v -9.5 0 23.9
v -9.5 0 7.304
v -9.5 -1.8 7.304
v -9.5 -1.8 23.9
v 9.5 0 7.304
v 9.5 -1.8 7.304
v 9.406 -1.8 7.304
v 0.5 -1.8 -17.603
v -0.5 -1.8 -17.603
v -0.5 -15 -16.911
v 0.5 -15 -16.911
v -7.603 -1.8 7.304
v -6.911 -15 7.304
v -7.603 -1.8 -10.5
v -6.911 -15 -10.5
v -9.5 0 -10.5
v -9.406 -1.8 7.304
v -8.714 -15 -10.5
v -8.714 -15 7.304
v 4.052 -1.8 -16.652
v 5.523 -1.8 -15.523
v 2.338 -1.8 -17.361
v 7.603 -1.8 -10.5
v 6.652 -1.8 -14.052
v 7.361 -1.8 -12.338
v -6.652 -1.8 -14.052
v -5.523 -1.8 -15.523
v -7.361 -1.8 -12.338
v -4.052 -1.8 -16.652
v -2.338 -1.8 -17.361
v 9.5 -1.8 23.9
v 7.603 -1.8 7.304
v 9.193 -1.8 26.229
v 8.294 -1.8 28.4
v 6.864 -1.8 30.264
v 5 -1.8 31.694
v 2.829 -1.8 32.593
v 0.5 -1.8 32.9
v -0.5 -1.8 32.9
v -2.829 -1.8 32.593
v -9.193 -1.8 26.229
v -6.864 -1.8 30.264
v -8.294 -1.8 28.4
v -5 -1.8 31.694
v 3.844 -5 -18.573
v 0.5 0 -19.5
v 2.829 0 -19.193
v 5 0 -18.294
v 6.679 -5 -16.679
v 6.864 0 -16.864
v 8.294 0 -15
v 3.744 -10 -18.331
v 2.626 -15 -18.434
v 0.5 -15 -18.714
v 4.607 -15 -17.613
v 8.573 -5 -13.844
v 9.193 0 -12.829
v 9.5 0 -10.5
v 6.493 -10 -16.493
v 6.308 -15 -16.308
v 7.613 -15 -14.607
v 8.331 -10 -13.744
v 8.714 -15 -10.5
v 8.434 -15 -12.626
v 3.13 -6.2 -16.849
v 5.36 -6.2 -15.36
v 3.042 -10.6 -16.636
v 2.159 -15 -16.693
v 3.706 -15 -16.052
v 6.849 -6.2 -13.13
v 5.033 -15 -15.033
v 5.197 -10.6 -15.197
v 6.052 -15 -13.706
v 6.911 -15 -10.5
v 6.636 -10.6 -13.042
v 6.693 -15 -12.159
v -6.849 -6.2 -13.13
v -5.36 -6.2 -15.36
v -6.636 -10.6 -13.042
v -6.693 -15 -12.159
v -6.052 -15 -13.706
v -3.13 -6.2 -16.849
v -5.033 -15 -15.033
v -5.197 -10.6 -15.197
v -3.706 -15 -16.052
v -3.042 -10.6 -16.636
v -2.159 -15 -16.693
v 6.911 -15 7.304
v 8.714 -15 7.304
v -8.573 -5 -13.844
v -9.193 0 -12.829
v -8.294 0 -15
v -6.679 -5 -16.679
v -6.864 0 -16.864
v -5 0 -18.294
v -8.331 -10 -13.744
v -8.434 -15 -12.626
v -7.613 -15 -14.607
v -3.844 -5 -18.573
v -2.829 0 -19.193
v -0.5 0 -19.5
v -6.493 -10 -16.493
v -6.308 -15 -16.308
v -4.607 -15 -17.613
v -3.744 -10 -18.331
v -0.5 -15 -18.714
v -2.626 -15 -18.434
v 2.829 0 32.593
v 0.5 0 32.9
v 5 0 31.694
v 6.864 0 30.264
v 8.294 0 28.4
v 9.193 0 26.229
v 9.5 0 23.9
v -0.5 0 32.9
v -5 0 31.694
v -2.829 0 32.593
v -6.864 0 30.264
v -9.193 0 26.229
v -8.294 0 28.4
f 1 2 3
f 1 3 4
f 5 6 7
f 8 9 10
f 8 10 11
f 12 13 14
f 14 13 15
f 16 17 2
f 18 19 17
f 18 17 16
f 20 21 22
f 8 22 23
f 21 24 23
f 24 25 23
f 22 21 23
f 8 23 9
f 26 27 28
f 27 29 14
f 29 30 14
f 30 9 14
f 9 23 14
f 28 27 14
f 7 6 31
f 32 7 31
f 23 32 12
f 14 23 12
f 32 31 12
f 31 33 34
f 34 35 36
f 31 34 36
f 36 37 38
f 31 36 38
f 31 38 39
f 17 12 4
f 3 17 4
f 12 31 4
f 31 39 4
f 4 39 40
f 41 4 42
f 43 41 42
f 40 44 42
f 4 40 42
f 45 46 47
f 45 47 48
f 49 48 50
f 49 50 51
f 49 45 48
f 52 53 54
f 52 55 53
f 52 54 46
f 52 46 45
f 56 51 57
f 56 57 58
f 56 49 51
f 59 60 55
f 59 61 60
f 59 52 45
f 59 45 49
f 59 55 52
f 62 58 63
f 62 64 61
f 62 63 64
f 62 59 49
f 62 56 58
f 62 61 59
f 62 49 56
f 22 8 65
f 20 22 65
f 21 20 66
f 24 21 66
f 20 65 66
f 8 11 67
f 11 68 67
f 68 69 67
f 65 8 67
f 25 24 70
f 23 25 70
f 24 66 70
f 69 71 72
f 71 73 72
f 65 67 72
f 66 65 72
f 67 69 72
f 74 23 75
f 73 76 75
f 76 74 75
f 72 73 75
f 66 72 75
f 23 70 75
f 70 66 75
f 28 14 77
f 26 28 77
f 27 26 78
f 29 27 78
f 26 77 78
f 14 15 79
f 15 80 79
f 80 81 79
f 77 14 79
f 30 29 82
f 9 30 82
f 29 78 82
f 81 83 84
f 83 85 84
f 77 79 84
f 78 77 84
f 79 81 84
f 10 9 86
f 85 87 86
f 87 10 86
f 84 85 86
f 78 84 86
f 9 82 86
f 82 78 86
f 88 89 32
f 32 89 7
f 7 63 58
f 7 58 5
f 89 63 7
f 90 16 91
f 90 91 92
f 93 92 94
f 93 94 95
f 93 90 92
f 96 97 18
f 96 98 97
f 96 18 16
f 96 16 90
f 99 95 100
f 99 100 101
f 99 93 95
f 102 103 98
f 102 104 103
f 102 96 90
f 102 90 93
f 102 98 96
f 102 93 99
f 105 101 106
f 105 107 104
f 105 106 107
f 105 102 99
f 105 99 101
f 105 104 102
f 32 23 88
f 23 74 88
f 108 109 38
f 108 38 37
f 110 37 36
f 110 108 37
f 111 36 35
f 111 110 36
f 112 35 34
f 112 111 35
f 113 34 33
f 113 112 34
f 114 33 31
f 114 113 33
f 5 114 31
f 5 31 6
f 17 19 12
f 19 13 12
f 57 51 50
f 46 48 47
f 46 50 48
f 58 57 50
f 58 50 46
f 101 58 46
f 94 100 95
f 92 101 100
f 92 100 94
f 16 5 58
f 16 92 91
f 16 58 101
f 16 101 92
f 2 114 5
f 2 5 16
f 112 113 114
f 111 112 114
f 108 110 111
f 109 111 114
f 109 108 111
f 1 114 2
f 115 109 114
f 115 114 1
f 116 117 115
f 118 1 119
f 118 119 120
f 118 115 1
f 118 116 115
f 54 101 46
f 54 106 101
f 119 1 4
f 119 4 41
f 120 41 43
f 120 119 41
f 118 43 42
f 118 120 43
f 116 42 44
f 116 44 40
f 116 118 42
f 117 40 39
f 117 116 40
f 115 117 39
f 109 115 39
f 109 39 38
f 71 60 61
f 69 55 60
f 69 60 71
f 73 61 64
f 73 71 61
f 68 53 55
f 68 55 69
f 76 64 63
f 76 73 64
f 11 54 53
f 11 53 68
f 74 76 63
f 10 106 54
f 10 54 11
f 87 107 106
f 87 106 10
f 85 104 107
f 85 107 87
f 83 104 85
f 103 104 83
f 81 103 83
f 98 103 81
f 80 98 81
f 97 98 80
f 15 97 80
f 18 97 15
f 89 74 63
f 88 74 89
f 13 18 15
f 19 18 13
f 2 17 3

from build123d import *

# Parameters (mm, degrees)
F1_DEPTH = 15
F1_TAPER = 3.0006
F2_T     = -1.8
F3_W     = 16.786262393
F3_H     = 17.0369902626
F4_DEPTH = 28
F6_DEPTH = 1.8


# Not quite as in the source:
# - ends of sketch curves that miss each other by under 0.0002 mm in the source are joined


with BuildPart() as f1:
    # F0 (on Front) → F1 (new body)
    with BuildSketch(Plane.XZ):
        with BuildLine():
            Line((0.5, 19.5), (-0.5, 19.5))
            ThreePointArc((-0.5, 19.5), (-6.8639610307, 16.8639610307), (-9.5, 10.5))
            Line((-9.5, 10.5), (-9.5, -10.5))
            ThreePointArc((-9.5, -10.5), (-6.8639610307, -16.8639610307), (-0.5, -19.5))
            Line((-0.5, -19.5), (0.5, -19.5))
            ThreePointArc((0.5, -19.5), (6.8639610307, -16.8639610307), (9.5, -10.5))
            Line((9.5, -10.5), (9.5, 10.5))
            ThreePointArc((9.5, 10.5), (6.8639610307, 16.8639610307), (0.5, 19.5))
        make_face()
    extrude(amount=F1_DEPTH, taper=F1_TAPER)

    # F2
    f2_openings = [f1.faces().sort_by_distance(p)[0] for p in [
        (0, 0, 0),
        (0, -15, 0),
    ]]
    offset(amount=F2_T, openings=f2_openings)

    # F3 (on Right) → F4 (cut, symmetric)
    with BuildSketch(Plane.YZ):
        with Locations((-8.3931311965, 15.8226261847)):
            Rectangle(F3_W, F3_H)
    extrude(amount=F4_DEPTH, both=True, mode=Mode.SUBTRACT)

    # F5 (on face) → F6 (join)
    with BuildSketch(Plane(origin=(0, 0, 0), x_dir=(-1, 0, 0), z_dir=(0, 1, 0))):
        with BuildLine():
            Line((0.5000003055, 32.8999999631), (-0.4999996945, 32.8999999631))
            ThreePointArc((-0.4999996945, 32.8999999631), (-6.8639607252, 30.2639609938), (-9.4999996945, 23.8999999631))
            Line((-9.4999996945, 23.8999999631), (-9.4999998419, 7.3041310534))
            Line((-9.4999998419, 7.3041310534), (-7.6975287879, 7.3041310534))
            Line((-7.6975287879, 7.3041310534), (-7.6975287879, -10.5))
            ThreePointArc((-7.6975287879, -10.5), (-5.5894214137, -15.5894214137), (-0.5, -17.6975287879))
            Line((-0.5, -17.6975287879), (0.5, -17.6975287879))
            ThreePointArc((0.5, -17.6975287879), (5.5894214137, -15.5894214137), (7.6975287879, -10.5))
            Line((7.6975287879, -10.5), (7.6975287879, 7.3041310534))
            Line((7.6975287879, 7.3041310534), (9.5, 7.3041310534))
            Line((9.5, 7.3041310534), (9.5000003055, 23.8999999631))
            ThreePointArc((9.5000003055, 23.8999999631), (6.8639613362, 30.2639609938), (0.5000003055, 32.8999999631))
        make_face()
    extrude(amount=-F6_DEPTH)


solid = f1.part
